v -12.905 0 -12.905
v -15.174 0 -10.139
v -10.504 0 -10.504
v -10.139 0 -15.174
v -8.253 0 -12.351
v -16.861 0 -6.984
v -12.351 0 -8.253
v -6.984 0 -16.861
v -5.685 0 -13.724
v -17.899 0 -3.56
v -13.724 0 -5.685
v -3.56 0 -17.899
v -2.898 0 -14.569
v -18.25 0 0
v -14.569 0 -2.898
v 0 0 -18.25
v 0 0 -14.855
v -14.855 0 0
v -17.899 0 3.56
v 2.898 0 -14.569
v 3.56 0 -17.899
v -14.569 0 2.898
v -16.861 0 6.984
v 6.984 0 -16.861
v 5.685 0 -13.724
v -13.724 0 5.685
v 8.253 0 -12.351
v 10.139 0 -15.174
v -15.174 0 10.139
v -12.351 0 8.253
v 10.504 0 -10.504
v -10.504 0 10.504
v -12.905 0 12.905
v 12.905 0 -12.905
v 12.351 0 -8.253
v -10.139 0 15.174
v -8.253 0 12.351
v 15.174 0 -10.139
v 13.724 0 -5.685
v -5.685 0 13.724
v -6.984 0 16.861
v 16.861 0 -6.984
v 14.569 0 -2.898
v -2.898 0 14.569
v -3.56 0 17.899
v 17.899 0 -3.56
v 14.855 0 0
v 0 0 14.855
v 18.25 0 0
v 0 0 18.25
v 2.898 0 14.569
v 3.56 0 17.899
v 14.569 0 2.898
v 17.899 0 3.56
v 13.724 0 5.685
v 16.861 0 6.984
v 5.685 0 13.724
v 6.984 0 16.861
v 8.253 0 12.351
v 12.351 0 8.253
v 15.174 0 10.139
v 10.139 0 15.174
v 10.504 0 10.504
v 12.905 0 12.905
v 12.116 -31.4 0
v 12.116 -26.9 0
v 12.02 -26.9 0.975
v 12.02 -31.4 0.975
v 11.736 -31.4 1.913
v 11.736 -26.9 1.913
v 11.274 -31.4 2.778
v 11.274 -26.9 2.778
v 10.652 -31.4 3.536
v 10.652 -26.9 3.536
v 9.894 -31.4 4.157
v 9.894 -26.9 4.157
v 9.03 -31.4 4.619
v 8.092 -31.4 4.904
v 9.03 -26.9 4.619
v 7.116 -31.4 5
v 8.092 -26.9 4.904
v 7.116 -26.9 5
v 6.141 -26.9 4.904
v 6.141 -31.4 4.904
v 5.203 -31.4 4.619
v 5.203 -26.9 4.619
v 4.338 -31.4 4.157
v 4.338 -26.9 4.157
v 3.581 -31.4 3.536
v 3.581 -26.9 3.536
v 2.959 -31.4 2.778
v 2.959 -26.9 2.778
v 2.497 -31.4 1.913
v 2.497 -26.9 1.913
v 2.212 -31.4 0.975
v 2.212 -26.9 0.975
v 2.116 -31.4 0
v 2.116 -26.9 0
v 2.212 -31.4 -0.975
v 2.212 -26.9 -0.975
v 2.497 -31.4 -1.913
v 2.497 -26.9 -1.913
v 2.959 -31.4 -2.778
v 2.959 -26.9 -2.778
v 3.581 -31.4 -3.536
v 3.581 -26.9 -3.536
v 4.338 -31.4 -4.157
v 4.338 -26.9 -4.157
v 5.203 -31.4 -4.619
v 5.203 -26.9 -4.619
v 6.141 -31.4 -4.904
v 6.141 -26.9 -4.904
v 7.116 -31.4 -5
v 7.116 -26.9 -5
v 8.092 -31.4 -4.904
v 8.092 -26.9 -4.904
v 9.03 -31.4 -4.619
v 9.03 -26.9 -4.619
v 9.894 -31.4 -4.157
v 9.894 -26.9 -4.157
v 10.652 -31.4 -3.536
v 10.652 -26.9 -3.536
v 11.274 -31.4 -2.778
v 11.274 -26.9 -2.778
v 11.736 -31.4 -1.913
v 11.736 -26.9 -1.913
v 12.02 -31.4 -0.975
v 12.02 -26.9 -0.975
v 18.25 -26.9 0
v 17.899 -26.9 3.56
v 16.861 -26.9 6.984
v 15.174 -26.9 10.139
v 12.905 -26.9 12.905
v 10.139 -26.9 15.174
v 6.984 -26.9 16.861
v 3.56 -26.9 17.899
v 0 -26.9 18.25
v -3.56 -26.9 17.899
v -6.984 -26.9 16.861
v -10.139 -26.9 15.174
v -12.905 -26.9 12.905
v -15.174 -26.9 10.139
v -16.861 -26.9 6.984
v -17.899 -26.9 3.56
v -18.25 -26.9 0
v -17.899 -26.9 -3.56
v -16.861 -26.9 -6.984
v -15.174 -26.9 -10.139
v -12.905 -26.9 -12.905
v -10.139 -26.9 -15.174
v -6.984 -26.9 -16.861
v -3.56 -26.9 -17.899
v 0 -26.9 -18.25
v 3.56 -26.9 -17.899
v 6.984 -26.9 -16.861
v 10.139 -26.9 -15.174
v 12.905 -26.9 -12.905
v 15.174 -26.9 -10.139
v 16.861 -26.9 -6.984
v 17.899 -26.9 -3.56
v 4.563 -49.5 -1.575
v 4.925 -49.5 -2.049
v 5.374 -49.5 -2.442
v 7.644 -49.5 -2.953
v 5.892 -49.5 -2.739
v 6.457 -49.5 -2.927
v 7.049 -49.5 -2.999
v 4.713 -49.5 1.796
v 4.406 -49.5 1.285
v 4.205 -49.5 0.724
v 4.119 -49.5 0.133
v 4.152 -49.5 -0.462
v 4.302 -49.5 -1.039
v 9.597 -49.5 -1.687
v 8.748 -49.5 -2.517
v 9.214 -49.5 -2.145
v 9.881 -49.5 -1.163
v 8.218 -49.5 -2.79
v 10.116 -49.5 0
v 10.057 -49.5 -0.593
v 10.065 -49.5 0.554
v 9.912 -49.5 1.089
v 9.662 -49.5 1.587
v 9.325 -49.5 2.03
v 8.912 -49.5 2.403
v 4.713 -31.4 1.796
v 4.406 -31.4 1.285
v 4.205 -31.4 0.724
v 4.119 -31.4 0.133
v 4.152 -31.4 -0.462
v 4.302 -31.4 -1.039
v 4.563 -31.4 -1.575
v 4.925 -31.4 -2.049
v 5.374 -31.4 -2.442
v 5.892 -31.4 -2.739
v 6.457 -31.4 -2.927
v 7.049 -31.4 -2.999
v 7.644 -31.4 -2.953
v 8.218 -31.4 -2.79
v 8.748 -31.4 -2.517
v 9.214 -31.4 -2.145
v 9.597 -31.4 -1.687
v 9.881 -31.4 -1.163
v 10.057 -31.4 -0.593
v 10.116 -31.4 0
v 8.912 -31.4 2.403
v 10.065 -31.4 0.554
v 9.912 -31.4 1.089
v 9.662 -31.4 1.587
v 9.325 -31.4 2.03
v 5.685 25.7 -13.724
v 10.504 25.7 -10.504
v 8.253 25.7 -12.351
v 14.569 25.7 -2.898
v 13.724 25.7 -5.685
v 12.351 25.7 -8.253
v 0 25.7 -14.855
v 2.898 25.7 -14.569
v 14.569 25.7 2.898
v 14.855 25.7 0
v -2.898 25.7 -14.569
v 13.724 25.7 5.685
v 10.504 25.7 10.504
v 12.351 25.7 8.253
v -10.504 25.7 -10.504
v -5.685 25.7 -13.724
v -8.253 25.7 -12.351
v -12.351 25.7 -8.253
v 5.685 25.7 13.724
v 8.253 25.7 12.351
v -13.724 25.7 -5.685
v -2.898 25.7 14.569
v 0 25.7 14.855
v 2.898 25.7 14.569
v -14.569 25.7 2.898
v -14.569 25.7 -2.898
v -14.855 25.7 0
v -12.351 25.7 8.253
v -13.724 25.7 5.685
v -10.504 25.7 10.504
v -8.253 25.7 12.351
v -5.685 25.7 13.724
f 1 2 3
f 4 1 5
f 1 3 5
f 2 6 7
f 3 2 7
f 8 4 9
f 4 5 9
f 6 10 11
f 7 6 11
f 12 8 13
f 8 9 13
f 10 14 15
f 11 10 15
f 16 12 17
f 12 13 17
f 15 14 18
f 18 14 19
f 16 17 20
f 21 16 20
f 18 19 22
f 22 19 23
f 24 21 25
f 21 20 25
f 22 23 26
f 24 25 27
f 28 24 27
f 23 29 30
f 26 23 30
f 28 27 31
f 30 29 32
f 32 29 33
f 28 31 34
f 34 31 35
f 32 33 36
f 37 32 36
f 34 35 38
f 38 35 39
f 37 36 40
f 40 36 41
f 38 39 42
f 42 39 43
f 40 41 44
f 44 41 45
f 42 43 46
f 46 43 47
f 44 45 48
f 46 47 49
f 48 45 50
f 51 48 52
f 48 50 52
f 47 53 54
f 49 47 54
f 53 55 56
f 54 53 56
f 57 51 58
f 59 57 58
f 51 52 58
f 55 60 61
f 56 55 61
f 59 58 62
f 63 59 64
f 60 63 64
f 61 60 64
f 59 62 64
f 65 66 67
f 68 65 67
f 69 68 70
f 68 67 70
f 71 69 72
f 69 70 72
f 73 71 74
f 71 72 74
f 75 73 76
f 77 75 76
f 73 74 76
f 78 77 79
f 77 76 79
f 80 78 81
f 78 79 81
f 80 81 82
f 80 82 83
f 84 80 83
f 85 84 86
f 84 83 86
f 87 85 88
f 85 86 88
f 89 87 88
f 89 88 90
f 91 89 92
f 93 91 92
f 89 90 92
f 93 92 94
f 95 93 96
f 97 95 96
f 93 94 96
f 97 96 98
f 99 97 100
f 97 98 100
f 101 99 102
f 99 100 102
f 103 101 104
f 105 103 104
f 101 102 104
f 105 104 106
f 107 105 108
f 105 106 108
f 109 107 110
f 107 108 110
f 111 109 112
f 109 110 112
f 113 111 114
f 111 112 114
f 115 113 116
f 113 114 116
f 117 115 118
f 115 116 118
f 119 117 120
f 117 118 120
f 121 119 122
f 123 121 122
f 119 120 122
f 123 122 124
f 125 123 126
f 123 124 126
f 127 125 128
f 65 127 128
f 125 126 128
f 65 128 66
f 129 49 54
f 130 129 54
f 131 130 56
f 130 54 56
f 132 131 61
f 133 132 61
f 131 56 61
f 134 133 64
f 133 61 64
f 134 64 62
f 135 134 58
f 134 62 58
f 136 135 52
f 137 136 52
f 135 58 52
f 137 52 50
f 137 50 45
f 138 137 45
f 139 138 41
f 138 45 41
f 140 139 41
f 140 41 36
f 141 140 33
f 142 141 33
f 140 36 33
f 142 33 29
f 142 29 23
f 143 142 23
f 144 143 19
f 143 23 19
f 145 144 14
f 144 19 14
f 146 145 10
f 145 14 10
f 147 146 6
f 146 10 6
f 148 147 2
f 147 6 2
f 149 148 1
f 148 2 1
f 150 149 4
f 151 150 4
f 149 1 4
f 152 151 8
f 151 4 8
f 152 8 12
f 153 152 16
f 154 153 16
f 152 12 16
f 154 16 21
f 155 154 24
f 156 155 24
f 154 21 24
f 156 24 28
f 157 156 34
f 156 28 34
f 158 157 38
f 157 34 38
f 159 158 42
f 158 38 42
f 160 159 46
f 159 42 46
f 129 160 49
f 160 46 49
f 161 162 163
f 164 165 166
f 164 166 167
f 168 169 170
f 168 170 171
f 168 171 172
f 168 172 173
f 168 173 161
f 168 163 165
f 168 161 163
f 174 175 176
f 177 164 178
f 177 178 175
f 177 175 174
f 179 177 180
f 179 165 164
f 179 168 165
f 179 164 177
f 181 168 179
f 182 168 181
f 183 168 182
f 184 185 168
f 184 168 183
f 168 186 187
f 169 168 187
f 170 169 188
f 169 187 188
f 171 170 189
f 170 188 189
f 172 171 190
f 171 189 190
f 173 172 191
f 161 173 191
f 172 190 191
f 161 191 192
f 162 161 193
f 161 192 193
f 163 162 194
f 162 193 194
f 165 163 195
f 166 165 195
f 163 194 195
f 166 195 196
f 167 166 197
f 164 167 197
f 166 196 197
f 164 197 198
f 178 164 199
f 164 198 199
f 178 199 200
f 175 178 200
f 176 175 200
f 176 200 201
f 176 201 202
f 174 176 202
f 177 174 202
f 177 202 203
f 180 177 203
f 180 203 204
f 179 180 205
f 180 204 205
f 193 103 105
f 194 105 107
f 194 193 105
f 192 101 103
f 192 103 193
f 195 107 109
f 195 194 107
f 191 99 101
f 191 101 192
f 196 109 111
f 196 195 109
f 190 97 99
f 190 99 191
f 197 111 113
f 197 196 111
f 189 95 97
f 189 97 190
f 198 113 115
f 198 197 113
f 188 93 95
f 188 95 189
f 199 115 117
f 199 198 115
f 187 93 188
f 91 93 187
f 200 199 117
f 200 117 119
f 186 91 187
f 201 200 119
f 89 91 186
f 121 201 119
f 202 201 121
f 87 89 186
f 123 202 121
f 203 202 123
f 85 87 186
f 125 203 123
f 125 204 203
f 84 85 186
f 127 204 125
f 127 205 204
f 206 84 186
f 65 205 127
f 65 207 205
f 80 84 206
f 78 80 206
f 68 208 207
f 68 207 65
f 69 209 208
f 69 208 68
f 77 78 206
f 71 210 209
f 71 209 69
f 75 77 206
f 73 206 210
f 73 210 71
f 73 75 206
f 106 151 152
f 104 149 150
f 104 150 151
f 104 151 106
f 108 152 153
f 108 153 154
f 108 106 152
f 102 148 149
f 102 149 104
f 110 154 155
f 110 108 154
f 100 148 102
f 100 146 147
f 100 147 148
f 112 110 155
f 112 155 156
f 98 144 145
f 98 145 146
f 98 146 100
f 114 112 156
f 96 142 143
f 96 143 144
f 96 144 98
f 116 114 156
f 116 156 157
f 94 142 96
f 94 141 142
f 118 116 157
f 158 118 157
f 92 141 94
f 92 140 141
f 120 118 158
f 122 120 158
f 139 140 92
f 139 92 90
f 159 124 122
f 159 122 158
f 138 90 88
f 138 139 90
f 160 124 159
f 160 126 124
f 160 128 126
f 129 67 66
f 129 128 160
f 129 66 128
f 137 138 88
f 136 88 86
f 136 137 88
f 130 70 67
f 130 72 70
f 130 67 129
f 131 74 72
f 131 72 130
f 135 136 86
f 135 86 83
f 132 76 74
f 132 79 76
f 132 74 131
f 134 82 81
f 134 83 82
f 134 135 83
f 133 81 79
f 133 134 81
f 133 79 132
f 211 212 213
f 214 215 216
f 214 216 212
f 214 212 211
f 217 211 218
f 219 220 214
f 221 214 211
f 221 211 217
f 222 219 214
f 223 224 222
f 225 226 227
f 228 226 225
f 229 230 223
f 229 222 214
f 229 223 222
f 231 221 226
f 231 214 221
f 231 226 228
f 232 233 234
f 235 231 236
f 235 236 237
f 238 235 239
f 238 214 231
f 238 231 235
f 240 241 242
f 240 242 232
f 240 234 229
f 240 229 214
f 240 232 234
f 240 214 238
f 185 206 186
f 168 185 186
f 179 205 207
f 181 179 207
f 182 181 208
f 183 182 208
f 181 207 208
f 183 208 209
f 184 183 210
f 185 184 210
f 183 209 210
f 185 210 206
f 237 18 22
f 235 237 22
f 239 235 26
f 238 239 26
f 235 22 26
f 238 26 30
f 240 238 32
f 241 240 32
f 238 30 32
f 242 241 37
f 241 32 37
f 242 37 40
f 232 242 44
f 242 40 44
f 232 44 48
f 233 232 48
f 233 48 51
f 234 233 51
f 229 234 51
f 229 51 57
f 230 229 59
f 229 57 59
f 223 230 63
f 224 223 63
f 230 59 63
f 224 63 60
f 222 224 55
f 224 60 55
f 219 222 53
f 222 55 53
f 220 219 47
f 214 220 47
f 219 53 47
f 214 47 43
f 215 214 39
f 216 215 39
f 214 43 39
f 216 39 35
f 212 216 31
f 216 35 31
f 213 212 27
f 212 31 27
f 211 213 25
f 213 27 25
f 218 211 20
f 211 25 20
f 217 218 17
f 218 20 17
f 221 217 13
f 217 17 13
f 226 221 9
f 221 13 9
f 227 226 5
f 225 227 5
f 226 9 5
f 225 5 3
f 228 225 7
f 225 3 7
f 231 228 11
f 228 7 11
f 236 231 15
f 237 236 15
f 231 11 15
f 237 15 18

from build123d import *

# Parameters (mm, degrees)
F0_R     = 18.25
F1_DEPTH = 26.9
F4_DEPTH = 4.5
F6_DEPTH = 18.1
F7_R     = 14.854724
F8_DEPTH = 25.7


with BuildPart() as f1:
    # F0 (on Front) → F1 (new body)
    with BuildSketch(Plane.XZ):
        Circle(F0_R)
    extrude(amount=F1_DEPTH)

    # F3 (on face) → F4 (join)
    with BuildSketch(Plane.XZ.offset(26.9)):
        with BuildLine():
            ThreePointArc((10.116222, 0), (7.116222, 3), (4.116222, 0))
            Line((4.116222, 0), (10.116222, 0))
        make_face()
        with BuildLine():
            Line((10.116222, 0), (4.116222, 0))
            ThreePointArc((4.116222, 0), (7.116222, -3), (10.116222, 0))
        make_face()
        with BuildLine():
            Line((4.116222, 0), (2.116222, 0))
            ThreePointArc((2.116222, 0), (7.116222, -5), (12.116222, 0))
            Line((12.116222, 0), (10.116222, 0))
            ThreePointArc((10.116222, 0), (7.116222, -3), (4.116222, 0))
        make_face()
        with BuildLine():
            ThreePointArc((12.116222, 0), (7.116222, 5), (2.116222, 0))
            Line((2.116222, 0), (4.116222, 0))
            ThreePointArc((4.116222, 0), (7.116222, 3), (10.116222, 0))
            Line((10.116222, 0), (12.116222, 0))
        make_face()
    extrude(amount=F4_DEPTH)

    # F5 (on face) → F6 (join)
    with BuildSketch(Plane.XZ.offset(31.4)):
        Polygon((7.116222, 0), (8.912379, 2.402878), (4.713345, 1.796157), align=None)
        with BuildLine():
            ThreePointArc((4.713345, 1.796157), (6.169817, -2.846808), (10.116222, 0))
            ThreePointArc((10.116222, 0), (9.798429, 1.343788), (8.912379, 2.402878))
            Line((8.912379, 2.402878), (7.116222, 0))
            Line((7.116222, 0), (4.713345, 1.796157))
        make_face()
    extrude(amount=F6_DEPTH)

    # F7 (on face) → F8 (join)
    with BuildSketch(Plane(origin=(0, 0, 0), x_dir=(-1, 0, 0), z_dir=(0, 1, 0))):
        Circle(F7_R)
    extrude(amount=F8_DEPTH)


solid = f1.part
